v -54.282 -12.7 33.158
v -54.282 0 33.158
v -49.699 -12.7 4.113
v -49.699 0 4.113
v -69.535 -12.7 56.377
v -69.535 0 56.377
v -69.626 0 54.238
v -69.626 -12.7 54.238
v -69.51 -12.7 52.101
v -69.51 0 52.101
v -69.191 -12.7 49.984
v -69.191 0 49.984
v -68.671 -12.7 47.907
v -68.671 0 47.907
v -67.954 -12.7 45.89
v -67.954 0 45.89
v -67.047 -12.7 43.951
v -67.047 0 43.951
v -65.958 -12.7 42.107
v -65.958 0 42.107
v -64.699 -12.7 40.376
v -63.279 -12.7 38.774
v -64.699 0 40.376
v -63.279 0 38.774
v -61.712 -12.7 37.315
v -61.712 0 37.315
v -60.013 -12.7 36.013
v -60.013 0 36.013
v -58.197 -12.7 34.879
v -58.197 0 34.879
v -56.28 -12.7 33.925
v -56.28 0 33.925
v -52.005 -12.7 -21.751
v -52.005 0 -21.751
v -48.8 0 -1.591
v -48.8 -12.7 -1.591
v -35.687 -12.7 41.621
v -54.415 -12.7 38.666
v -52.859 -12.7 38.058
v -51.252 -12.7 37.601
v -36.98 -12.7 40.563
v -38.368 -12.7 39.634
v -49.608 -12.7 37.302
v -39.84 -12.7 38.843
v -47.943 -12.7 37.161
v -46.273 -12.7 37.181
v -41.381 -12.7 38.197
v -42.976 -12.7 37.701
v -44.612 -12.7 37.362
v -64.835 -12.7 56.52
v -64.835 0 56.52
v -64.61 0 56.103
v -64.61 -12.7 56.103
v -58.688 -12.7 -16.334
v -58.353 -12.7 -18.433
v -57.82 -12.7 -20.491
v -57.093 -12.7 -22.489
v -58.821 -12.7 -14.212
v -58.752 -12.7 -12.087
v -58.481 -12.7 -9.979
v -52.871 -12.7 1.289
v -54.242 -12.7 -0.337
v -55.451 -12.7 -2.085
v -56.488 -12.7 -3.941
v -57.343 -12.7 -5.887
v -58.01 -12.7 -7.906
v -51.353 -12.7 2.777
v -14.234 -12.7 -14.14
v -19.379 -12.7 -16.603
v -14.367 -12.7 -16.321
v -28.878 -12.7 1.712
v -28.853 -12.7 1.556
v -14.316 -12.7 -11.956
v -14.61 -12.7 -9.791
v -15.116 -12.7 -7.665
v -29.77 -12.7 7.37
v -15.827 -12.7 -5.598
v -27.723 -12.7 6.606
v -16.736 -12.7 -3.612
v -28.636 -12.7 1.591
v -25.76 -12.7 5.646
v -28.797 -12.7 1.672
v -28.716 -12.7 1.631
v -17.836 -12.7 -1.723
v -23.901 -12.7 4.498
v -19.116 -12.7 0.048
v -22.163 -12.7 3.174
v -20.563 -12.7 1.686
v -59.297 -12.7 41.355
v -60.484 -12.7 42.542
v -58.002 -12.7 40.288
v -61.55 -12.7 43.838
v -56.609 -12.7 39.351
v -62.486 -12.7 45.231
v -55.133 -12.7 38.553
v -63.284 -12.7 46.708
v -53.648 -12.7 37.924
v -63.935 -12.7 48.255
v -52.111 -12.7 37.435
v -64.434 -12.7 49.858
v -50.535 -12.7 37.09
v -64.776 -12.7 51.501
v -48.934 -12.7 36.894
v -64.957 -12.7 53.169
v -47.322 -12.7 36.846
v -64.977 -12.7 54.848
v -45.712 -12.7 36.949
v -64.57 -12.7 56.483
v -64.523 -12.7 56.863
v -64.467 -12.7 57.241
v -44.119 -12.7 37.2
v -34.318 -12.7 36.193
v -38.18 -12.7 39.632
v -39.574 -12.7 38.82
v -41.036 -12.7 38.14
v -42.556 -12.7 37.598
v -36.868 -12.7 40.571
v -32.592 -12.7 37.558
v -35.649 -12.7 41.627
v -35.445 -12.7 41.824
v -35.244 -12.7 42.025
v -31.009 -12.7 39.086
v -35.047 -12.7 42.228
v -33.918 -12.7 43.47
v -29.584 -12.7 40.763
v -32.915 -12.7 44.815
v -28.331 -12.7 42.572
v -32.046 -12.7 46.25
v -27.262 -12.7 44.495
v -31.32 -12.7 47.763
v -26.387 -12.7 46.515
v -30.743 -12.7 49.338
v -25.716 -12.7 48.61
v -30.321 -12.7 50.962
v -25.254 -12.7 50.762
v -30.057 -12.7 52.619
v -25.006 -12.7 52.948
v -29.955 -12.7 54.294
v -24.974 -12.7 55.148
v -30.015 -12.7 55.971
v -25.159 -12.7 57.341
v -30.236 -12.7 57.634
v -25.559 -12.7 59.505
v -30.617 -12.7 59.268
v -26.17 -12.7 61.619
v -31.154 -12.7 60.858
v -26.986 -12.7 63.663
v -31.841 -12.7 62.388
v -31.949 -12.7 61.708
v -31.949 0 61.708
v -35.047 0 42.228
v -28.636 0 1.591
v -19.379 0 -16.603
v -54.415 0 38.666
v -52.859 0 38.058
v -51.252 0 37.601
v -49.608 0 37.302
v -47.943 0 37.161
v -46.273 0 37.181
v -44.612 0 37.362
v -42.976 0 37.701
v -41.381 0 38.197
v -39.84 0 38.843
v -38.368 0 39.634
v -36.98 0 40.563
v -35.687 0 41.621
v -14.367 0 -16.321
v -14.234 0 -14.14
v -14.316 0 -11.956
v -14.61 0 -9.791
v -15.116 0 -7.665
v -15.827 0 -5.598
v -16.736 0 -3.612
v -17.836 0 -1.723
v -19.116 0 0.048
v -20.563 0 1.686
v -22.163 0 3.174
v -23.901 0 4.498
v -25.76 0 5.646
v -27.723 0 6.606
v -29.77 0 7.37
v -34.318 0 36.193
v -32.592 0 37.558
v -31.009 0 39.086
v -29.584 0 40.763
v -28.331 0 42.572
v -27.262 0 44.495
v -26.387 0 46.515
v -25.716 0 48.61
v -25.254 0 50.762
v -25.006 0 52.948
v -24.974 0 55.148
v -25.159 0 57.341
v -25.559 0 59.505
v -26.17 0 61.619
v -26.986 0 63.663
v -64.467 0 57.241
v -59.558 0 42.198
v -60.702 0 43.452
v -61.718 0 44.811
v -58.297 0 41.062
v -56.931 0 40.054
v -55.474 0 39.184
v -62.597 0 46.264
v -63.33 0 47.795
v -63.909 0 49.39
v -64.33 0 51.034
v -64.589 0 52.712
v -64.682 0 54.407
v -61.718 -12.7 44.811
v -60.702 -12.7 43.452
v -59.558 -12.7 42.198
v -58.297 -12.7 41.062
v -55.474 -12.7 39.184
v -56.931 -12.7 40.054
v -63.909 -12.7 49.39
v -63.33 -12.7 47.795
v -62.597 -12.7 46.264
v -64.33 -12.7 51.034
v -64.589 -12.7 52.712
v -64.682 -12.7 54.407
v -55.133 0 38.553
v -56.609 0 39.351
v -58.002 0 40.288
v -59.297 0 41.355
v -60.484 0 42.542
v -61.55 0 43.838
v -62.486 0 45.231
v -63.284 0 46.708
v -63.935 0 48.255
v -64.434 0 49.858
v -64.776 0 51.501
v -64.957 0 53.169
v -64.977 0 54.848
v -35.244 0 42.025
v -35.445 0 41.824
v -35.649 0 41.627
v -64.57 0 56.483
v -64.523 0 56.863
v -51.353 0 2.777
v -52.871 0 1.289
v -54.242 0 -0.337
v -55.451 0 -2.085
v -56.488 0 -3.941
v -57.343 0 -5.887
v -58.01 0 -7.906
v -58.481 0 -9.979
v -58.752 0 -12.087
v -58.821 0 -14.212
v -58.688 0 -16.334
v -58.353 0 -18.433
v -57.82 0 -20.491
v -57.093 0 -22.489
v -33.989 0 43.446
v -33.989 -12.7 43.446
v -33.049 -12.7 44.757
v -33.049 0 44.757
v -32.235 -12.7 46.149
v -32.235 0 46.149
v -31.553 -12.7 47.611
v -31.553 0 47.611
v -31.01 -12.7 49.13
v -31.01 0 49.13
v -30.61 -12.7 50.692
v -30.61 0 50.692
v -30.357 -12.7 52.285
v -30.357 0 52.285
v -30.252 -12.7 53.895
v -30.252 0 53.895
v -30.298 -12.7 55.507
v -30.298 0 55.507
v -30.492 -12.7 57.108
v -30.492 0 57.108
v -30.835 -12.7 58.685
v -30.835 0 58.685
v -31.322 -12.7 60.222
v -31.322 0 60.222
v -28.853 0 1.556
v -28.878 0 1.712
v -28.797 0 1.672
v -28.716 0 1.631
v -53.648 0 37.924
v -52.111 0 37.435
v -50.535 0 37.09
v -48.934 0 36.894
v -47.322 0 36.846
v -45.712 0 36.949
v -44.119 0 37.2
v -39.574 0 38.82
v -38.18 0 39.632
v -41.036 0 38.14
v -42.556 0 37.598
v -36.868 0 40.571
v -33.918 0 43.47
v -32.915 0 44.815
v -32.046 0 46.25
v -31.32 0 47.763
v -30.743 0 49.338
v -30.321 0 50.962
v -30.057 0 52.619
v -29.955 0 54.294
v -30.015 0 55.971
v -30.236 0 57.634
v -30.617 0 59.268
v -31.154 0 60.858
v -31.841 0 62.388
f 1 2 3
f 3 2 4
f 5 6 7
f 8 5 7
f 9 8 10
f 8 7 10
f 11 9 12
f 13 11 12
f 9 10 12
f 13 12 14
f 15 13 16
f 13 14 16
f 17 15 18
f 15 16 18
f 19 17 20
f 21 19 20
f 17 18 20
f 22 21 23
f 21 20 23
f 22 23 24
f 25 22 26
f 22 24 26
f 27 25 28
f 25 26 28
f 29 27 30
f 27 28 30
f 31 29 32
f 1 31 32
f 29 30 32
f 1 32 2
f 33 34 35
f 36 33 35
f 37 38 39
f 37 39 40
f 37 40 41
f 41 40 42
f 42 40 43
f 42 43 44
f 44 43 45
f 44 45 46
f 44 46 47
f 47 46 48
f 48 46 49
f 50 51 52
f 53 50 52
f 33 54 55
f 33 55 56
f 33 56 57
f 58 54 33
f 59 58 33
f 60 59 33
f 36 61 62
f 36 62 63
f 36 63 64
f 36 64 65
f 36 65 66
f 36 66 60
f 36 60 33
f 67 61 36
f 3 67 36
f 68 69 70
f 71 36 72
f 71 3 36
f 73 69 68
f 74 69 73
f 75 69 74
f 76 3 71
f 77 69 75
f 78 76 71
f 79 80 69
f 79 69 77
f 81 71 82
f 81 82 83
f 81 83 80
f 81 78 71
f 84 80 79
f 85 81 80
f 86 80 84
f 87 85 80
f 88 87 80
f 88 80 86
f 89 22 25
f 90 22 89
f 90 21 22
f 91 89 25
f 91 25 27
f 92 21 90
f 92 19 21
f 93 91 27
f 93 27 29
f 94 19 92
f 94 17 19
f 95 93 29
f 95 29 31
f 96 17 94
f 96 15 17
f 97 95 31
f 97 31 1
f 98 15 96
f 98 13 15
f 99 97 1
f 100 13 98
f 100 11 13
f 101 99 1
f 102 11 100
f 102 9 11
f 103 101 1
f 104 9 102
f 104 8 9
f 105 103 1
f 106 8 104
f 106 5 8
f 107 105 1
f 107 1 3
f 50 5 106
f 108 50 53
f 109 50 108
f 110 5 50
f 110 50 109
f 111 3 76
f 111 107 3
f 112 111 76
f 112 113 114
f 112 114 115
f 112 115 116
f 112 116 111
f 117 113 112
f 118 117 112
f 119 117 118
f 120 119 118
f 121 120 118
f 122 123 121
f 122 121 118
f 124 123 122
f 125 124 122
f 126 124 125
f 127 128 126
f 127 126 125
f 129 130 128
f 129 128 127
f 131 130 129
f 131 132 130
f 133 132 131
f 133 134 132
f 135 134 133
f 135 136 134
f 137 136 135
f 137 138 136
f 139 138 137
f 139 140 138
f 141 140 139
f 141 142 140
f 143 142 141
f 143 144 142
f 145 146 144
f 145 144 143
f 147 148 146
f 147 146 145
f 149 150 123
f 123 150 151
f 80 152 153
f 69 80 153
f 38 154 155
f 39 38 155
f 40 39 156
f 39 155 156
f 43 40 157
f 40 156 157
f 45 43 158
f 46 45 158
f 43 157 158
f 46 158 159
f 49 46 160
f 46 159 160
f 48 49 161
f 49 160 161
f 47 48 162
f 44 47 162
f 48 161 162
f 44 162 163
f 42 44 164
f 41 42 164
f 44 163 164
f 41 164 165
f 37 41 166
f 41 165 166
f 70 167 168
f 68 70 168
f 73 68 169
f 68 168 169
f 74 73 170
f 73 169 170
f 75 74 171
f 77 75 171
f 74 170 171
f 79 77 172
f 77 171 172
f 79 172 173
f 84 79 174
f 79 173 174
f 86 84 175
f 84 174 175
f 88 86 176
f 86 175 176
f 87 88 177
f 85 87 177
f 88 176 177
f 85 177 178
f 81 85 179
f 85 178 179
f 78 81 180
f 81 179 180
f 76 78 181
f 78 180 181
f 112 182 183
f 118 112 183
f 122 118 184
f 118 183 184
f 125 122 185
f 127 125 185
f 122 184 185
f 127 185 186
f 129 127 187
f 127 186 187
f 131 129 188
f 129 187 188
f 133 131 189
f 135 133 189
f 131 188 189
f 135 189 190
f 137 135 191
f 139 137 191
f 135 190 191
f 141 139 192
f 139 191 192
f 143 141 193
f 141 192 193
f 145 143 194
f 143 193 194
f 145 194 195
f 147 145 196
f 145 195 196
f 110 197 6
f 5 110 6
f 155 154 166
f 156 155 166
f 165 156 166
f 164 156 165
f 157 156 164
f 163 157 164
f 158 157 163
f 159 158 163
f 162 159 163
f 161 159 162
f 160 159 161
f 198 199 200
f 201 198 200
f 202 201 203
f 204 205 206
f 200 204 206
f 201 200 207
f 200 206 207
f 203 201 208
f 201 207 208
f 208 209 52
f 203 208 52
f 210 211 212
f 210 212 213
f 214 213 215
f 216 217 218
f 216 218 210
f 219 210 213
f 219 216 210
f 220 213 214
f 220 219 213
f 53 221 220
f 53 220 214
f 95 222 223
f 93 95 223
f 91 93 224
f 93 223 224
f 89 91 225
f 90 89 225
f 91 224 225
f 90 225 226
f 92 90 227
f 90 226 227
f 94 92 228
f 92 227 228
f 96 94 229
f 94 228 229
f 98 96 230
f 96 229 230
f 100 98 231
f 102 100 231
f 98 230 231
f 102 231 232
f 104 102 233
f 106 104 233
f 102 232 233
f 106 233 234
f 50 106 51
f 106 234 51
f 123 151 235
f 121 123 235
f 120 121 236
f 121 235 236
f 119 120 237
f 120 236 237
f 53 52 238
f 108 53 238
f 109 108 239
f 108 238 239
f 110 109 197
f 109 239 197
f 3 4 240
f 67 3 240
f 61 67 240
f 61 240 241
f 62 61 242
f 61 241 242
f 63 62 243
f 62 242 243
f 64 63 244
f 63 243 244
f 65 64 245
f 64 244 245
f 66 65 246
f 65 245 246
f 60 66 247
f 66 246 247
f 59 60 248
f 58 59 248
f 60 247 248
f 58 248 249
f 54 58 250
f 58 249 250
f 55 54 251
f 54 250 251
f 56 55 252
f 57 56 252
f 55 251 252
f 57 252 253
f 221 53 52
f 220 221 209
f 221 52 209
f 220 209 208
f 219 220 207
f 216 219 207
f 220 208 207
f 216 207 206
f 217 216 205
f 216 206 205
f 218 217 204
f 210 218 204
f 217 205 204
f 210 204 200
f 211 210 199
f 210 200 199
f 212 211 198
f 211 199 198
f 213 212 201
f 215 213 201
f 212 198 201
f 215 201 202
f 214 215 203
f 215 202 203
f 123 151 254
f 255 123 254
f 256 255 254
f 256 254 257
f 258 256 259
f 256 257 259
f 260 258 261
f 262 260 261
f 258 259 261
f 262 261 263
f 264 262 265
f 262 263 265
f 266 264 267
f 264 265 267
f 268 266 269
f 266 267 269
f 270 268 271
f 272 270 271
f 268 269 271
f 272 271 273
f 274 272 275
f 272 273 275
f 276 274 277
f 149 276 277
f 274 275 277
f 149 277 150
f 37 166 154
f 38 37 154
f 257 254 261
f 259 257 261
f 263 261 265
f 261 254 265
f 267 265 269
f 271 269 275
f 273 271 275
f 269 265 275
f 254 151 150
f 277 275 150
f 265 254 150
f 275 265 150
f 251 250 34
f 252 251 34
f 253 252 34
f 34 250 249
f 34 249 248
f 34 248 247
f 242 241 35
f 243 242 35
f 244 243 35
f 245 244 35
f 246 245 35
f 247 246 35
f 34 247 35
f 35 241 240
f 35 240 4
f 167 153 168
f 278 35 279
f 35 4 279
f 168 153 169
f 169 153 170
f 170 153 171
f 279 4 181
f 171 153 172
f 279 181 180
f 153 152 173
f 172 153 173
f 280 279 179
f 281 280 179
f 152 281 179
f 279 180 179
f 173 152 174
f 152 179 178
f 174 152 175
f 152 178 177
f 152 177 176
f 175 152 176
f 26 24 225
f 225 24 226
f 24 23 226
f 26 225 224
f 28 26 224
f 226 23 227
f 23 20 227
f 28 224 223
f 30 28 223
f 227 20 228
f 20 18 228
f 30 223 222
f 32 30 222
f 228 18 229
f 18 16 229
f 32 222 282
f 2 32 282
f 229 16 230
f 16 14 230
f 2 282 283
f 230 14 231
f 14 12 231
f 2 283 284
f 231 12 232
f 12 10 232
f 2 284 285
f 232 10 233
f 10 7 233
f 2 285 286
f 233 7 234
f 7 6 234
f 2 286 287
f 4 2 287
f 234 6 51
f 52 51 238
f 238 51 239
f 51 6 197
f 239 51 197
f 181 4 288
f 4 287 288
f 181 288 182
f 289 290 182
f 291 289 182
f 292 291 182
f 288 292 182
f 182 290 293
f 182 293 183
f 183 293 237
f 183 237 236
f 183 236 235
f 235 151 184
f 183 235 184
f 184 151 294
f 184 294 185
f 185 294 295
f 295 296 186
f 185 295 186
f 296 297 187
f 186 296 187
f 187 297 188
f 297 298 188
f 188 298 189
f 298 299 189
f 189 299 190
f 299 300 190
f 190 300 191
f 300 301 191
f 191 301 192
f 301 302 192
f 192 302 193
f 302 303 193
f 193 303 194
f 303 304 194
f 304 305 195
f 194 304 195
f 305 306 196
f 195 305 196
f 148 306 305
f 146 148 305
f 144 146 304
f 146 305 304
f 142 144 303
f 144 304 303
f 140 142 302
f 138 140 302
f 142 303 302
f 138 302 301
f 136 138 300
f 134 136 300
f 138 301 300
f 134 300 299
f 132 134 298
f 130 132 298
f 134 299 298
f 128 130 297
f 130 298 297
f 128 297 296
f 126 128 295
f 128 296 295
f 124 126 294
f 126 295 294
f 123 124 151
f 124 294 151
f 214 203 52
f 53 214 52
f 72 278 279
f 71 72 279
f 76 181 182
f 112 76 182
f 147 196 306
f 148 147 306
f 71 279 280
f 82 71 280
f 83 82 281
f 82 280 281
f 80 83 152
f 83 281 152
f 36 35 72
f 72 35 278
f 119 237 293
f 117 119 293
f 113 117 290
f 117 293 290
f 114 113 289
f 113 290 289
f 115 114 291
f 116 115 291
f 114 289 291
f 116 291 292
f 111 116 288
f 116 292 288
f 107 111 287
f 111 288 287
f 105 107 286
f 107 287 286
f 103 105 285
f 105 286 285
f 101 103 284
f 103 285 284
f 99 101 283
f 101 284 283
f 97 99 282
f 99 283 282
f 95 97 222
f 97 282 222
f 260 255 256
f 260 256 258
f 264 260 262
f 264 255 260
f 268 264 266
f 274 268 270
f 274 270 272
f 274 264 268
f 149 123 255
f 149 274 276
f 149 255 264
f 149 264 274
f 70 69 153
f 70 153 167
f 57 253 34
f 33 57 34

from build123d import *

# Parameters (mm, degrees)
F1_DEPTH = 12.7


with BuildPart() as f1:
    # F0 (on Front) → F1 (new body)
    with BuildSketch(Plane.XZ):
        with BuildLine():
            Line((-48.7995083992, -1.5905502483), (-28.8532047719, 1.556229154))
            Line((-28.8532047719, 1.556229154), (-28.8777340522, 1.7117114456))
            ThreePointArc((-28.8777340522, 1.7117114456), (-39.3680005528, 3.2542025696), (-48.7995083992, -1.5905502483))
        make_face()
        with BuildLine():
            ThreePointArc((-48.7995083992, -1.5905502483), (-39.3680005528, 3.2542025696), (-28.8777340522, 1.7117114456))
            Line((-28.8777340522, 1.7117114456), (-29.7704133367, 7.3700845868))
            ThreePointArc((-29.7704133367, 7.3700845868), (-40.124753878, 8.1269858394), (-49.6992845111, 4.1128071308))
            Line((-49.6992845111, 4.1128071308), (-48.7995083992, -1.5905502483))
        make_face()
        with BuildLine():
            Line((-29.7704133367, 7.3700845868), (-28.8777340522, 1.7117114456))
            ThreePointArc((-28.8777340522, 1.7117114456), (-28.7564587611, 1.6516025926), (-28.6356556912, 1.5905502483))
            ThreePointArc((-28.6356556912, 1.5905502483), (-21.0516796779, -6.0026344403), (-19.3792761761, -16.6033991491))
            Line((-19.3792761761, -16.6033991491), (-14.3672252335, -16.3208022891))
            ThreePointArc((-14.3672252335, -16.3208022891), (-17.8363108802, -1.7234938217), (-29.7704133367, 7.3700845868))
        make_face()
        with BuildLine():
            ThreePointArc((-52.0050752019, -21.7505278741), (-53.6774787037, -11.1497631653), (-48.7995083992, -1.5905502483))
            Line((-48.7995083992, -1.5905502483), (-49.6992845111, 4.1128071308))
            ThreePointArc((-49.6992845111, 4.1128071308), (-58.0095489431, -7.9058060898), (-57.0933466821, -22.4889515699))
            Line((-57.0933466821, -22.4889515699), (-52.0050752019, -21.7505278741))
        make_face()
        with BuildLine():
            Line((-52.0050752019, -21.7505278741), (-48.7995083992, -1.5905502483))
            ThreePointArc((-48.7995083992, -1.5905502483), (-53.6774787037, -11.1497631653), (-52.0050752019, -21.7505278741))
        make_face()
        with BuildLine():
            ThreePointArc((-19.3792761761, -16.6033991491), (-21.0516796779, -6.0026344403), (-28.6356556912, 1.5905502483))
            Line((-28.6356556912, 1.5905502483), (-19.3792761761, -16.6033991491))
        make_face()
        with BuildLine():
            ThreePointArc((-49.6992845111, 4.1128071308), (-40.124753878, 8.1269858394), (-29.7704133367, 7.3700845868))
            Line((-29.7704133367, 7.3700845868), (-34.3175456617, 36.1927220814))
            ThreePointArc((-34.3175456617, 36.1927220814), (-43.9369802174, 32.2901614466), (-54.2815496204, 33.1581387178))
            Line((-54.2815496204, 33.1581387178), (-49.6992845111, 4.1128071308))
        make_face()
        with BuildLine():
            ThreePointArc((-54.2815496204, 33.1581387178), (-43.9369802174, 32.2901614466), (-34.3175456617, 36.1927220814))
            Line((-34.3175456617, 36.1927220814), (-35.1863457074, 41.6997333097))
            Line((-35.1863457074, 41.6997333097), (-35.6492351188, 41.6267067032))
            ThreePointArc((-35.6492351188, 41.6267067032), (-44.912324279, 37.0560431574), (-55.1326493347, 38.5529539073))
            Line((-55.1326493347, 38.5529539073), (-54.2815496204, 33.1581387178))
        make_face()
        with BuildLine():
            Line((-35.1863457074, 41.6997333097), (-34.3175456617, 36.1927220814))
            ThreePointArc((-34.3175456617, 36.1927220814), (-25.7156020352, 48.6101817009), (-26.9856018058, 63.6625515522))
            Line((-26.9856018058, 63.6625515522), (-31.8412224938, 62.388399532))
            ThreePointArc((-31.8412224938, 62.388399532), (-30.168818992, 51.7876348232), (-35.0467892965, 42.2284219061))
            ThreePointArc((-35.0467892965, 42.2284219061), (-35.3443246218, 41.9238722412), (-35.6492351188, 41.6267067032))
            Line((-35.6492351188, 41.6267067032), (-35.1863457074, 41.6997333097))
        make_face()
        with BuildLine():
            ThreePointArc((-69.5354928411, 56.3773410221), (-65.958395671, 42.107159461), (-54.2815496204, 33.1581387178))
            Line((-54.2815496204, 33.1581387178), (-55.1326493347, 38.5529539073))
            ThreePointArc((-55.1326493347, 38.5529539073), (-62.9027913452, 45.9601983724), (-64.8350992238, 56.5199599082))
            Line((-64.8350992238, 56.5199599082), (-64.6096867091, 56.1025407975))
            ThreePointArc((-64.6096867091, 56.1025407975), (-64.5477640968, 56.6730847269), (-64.4670215196, 57.241270807))
            Line((-64.4670215196, 57.241270807), (-69.5354928411, 56.3773410221))
        make_face()
    extrude(amount=F1_DEPTH)


with BuildPart() as f1b:
    # F0 (on Front) → F1, piece 2 (new body)
    with BuildSketch(Plane.XZ):
        with BuildLine():
            Line((-35.6869321752, 41.62075952), (-54.4145137861, 38.6662487912))
            ThreePointArc((-54.4145137861, 38.6662487912), (-44.611914547, 37.3620552095), (-35.6869321752, 41.62075952))
        make_face()
    extrude(amount=F1_DEPTH)


with BuildPart() as f1c:
    # F0 (on Front) → F1, piece 3 (new body)
    with BuildSketch(Plane.XZ):
        with BuildLine():
            ThreePointArc((-64.6096867091, 56.1025407975), (-62.5969769393, 46.2635354492), (-55.473616533, 39.1843572918))
            Line((-55.473616533, 39.1843572918), (-64.6096867091, 56.1025407975))
        make_face()
    extrude(amount=F1_DEPTH)


with BuildPart() as f1d:
    # F0 (on Front) → F1, piece 4 (new body)
    with BuildSketch(Plane.XZ):
        with BuildLine():
            Line((-31.9493958213, 61.7080918062), (-35.0467892965, 42.2284219061))
            ThreePointArc((-35.0467892965, 42.2284219061), (-30.4648884431, 51.4859577882), (-31.9493958213, 61.7080918062))
        make_face()
    extrude(amount=F1_DEPTH)


solid = Compound([f1.part, f1b.part, f1c.part, f1d.part])
